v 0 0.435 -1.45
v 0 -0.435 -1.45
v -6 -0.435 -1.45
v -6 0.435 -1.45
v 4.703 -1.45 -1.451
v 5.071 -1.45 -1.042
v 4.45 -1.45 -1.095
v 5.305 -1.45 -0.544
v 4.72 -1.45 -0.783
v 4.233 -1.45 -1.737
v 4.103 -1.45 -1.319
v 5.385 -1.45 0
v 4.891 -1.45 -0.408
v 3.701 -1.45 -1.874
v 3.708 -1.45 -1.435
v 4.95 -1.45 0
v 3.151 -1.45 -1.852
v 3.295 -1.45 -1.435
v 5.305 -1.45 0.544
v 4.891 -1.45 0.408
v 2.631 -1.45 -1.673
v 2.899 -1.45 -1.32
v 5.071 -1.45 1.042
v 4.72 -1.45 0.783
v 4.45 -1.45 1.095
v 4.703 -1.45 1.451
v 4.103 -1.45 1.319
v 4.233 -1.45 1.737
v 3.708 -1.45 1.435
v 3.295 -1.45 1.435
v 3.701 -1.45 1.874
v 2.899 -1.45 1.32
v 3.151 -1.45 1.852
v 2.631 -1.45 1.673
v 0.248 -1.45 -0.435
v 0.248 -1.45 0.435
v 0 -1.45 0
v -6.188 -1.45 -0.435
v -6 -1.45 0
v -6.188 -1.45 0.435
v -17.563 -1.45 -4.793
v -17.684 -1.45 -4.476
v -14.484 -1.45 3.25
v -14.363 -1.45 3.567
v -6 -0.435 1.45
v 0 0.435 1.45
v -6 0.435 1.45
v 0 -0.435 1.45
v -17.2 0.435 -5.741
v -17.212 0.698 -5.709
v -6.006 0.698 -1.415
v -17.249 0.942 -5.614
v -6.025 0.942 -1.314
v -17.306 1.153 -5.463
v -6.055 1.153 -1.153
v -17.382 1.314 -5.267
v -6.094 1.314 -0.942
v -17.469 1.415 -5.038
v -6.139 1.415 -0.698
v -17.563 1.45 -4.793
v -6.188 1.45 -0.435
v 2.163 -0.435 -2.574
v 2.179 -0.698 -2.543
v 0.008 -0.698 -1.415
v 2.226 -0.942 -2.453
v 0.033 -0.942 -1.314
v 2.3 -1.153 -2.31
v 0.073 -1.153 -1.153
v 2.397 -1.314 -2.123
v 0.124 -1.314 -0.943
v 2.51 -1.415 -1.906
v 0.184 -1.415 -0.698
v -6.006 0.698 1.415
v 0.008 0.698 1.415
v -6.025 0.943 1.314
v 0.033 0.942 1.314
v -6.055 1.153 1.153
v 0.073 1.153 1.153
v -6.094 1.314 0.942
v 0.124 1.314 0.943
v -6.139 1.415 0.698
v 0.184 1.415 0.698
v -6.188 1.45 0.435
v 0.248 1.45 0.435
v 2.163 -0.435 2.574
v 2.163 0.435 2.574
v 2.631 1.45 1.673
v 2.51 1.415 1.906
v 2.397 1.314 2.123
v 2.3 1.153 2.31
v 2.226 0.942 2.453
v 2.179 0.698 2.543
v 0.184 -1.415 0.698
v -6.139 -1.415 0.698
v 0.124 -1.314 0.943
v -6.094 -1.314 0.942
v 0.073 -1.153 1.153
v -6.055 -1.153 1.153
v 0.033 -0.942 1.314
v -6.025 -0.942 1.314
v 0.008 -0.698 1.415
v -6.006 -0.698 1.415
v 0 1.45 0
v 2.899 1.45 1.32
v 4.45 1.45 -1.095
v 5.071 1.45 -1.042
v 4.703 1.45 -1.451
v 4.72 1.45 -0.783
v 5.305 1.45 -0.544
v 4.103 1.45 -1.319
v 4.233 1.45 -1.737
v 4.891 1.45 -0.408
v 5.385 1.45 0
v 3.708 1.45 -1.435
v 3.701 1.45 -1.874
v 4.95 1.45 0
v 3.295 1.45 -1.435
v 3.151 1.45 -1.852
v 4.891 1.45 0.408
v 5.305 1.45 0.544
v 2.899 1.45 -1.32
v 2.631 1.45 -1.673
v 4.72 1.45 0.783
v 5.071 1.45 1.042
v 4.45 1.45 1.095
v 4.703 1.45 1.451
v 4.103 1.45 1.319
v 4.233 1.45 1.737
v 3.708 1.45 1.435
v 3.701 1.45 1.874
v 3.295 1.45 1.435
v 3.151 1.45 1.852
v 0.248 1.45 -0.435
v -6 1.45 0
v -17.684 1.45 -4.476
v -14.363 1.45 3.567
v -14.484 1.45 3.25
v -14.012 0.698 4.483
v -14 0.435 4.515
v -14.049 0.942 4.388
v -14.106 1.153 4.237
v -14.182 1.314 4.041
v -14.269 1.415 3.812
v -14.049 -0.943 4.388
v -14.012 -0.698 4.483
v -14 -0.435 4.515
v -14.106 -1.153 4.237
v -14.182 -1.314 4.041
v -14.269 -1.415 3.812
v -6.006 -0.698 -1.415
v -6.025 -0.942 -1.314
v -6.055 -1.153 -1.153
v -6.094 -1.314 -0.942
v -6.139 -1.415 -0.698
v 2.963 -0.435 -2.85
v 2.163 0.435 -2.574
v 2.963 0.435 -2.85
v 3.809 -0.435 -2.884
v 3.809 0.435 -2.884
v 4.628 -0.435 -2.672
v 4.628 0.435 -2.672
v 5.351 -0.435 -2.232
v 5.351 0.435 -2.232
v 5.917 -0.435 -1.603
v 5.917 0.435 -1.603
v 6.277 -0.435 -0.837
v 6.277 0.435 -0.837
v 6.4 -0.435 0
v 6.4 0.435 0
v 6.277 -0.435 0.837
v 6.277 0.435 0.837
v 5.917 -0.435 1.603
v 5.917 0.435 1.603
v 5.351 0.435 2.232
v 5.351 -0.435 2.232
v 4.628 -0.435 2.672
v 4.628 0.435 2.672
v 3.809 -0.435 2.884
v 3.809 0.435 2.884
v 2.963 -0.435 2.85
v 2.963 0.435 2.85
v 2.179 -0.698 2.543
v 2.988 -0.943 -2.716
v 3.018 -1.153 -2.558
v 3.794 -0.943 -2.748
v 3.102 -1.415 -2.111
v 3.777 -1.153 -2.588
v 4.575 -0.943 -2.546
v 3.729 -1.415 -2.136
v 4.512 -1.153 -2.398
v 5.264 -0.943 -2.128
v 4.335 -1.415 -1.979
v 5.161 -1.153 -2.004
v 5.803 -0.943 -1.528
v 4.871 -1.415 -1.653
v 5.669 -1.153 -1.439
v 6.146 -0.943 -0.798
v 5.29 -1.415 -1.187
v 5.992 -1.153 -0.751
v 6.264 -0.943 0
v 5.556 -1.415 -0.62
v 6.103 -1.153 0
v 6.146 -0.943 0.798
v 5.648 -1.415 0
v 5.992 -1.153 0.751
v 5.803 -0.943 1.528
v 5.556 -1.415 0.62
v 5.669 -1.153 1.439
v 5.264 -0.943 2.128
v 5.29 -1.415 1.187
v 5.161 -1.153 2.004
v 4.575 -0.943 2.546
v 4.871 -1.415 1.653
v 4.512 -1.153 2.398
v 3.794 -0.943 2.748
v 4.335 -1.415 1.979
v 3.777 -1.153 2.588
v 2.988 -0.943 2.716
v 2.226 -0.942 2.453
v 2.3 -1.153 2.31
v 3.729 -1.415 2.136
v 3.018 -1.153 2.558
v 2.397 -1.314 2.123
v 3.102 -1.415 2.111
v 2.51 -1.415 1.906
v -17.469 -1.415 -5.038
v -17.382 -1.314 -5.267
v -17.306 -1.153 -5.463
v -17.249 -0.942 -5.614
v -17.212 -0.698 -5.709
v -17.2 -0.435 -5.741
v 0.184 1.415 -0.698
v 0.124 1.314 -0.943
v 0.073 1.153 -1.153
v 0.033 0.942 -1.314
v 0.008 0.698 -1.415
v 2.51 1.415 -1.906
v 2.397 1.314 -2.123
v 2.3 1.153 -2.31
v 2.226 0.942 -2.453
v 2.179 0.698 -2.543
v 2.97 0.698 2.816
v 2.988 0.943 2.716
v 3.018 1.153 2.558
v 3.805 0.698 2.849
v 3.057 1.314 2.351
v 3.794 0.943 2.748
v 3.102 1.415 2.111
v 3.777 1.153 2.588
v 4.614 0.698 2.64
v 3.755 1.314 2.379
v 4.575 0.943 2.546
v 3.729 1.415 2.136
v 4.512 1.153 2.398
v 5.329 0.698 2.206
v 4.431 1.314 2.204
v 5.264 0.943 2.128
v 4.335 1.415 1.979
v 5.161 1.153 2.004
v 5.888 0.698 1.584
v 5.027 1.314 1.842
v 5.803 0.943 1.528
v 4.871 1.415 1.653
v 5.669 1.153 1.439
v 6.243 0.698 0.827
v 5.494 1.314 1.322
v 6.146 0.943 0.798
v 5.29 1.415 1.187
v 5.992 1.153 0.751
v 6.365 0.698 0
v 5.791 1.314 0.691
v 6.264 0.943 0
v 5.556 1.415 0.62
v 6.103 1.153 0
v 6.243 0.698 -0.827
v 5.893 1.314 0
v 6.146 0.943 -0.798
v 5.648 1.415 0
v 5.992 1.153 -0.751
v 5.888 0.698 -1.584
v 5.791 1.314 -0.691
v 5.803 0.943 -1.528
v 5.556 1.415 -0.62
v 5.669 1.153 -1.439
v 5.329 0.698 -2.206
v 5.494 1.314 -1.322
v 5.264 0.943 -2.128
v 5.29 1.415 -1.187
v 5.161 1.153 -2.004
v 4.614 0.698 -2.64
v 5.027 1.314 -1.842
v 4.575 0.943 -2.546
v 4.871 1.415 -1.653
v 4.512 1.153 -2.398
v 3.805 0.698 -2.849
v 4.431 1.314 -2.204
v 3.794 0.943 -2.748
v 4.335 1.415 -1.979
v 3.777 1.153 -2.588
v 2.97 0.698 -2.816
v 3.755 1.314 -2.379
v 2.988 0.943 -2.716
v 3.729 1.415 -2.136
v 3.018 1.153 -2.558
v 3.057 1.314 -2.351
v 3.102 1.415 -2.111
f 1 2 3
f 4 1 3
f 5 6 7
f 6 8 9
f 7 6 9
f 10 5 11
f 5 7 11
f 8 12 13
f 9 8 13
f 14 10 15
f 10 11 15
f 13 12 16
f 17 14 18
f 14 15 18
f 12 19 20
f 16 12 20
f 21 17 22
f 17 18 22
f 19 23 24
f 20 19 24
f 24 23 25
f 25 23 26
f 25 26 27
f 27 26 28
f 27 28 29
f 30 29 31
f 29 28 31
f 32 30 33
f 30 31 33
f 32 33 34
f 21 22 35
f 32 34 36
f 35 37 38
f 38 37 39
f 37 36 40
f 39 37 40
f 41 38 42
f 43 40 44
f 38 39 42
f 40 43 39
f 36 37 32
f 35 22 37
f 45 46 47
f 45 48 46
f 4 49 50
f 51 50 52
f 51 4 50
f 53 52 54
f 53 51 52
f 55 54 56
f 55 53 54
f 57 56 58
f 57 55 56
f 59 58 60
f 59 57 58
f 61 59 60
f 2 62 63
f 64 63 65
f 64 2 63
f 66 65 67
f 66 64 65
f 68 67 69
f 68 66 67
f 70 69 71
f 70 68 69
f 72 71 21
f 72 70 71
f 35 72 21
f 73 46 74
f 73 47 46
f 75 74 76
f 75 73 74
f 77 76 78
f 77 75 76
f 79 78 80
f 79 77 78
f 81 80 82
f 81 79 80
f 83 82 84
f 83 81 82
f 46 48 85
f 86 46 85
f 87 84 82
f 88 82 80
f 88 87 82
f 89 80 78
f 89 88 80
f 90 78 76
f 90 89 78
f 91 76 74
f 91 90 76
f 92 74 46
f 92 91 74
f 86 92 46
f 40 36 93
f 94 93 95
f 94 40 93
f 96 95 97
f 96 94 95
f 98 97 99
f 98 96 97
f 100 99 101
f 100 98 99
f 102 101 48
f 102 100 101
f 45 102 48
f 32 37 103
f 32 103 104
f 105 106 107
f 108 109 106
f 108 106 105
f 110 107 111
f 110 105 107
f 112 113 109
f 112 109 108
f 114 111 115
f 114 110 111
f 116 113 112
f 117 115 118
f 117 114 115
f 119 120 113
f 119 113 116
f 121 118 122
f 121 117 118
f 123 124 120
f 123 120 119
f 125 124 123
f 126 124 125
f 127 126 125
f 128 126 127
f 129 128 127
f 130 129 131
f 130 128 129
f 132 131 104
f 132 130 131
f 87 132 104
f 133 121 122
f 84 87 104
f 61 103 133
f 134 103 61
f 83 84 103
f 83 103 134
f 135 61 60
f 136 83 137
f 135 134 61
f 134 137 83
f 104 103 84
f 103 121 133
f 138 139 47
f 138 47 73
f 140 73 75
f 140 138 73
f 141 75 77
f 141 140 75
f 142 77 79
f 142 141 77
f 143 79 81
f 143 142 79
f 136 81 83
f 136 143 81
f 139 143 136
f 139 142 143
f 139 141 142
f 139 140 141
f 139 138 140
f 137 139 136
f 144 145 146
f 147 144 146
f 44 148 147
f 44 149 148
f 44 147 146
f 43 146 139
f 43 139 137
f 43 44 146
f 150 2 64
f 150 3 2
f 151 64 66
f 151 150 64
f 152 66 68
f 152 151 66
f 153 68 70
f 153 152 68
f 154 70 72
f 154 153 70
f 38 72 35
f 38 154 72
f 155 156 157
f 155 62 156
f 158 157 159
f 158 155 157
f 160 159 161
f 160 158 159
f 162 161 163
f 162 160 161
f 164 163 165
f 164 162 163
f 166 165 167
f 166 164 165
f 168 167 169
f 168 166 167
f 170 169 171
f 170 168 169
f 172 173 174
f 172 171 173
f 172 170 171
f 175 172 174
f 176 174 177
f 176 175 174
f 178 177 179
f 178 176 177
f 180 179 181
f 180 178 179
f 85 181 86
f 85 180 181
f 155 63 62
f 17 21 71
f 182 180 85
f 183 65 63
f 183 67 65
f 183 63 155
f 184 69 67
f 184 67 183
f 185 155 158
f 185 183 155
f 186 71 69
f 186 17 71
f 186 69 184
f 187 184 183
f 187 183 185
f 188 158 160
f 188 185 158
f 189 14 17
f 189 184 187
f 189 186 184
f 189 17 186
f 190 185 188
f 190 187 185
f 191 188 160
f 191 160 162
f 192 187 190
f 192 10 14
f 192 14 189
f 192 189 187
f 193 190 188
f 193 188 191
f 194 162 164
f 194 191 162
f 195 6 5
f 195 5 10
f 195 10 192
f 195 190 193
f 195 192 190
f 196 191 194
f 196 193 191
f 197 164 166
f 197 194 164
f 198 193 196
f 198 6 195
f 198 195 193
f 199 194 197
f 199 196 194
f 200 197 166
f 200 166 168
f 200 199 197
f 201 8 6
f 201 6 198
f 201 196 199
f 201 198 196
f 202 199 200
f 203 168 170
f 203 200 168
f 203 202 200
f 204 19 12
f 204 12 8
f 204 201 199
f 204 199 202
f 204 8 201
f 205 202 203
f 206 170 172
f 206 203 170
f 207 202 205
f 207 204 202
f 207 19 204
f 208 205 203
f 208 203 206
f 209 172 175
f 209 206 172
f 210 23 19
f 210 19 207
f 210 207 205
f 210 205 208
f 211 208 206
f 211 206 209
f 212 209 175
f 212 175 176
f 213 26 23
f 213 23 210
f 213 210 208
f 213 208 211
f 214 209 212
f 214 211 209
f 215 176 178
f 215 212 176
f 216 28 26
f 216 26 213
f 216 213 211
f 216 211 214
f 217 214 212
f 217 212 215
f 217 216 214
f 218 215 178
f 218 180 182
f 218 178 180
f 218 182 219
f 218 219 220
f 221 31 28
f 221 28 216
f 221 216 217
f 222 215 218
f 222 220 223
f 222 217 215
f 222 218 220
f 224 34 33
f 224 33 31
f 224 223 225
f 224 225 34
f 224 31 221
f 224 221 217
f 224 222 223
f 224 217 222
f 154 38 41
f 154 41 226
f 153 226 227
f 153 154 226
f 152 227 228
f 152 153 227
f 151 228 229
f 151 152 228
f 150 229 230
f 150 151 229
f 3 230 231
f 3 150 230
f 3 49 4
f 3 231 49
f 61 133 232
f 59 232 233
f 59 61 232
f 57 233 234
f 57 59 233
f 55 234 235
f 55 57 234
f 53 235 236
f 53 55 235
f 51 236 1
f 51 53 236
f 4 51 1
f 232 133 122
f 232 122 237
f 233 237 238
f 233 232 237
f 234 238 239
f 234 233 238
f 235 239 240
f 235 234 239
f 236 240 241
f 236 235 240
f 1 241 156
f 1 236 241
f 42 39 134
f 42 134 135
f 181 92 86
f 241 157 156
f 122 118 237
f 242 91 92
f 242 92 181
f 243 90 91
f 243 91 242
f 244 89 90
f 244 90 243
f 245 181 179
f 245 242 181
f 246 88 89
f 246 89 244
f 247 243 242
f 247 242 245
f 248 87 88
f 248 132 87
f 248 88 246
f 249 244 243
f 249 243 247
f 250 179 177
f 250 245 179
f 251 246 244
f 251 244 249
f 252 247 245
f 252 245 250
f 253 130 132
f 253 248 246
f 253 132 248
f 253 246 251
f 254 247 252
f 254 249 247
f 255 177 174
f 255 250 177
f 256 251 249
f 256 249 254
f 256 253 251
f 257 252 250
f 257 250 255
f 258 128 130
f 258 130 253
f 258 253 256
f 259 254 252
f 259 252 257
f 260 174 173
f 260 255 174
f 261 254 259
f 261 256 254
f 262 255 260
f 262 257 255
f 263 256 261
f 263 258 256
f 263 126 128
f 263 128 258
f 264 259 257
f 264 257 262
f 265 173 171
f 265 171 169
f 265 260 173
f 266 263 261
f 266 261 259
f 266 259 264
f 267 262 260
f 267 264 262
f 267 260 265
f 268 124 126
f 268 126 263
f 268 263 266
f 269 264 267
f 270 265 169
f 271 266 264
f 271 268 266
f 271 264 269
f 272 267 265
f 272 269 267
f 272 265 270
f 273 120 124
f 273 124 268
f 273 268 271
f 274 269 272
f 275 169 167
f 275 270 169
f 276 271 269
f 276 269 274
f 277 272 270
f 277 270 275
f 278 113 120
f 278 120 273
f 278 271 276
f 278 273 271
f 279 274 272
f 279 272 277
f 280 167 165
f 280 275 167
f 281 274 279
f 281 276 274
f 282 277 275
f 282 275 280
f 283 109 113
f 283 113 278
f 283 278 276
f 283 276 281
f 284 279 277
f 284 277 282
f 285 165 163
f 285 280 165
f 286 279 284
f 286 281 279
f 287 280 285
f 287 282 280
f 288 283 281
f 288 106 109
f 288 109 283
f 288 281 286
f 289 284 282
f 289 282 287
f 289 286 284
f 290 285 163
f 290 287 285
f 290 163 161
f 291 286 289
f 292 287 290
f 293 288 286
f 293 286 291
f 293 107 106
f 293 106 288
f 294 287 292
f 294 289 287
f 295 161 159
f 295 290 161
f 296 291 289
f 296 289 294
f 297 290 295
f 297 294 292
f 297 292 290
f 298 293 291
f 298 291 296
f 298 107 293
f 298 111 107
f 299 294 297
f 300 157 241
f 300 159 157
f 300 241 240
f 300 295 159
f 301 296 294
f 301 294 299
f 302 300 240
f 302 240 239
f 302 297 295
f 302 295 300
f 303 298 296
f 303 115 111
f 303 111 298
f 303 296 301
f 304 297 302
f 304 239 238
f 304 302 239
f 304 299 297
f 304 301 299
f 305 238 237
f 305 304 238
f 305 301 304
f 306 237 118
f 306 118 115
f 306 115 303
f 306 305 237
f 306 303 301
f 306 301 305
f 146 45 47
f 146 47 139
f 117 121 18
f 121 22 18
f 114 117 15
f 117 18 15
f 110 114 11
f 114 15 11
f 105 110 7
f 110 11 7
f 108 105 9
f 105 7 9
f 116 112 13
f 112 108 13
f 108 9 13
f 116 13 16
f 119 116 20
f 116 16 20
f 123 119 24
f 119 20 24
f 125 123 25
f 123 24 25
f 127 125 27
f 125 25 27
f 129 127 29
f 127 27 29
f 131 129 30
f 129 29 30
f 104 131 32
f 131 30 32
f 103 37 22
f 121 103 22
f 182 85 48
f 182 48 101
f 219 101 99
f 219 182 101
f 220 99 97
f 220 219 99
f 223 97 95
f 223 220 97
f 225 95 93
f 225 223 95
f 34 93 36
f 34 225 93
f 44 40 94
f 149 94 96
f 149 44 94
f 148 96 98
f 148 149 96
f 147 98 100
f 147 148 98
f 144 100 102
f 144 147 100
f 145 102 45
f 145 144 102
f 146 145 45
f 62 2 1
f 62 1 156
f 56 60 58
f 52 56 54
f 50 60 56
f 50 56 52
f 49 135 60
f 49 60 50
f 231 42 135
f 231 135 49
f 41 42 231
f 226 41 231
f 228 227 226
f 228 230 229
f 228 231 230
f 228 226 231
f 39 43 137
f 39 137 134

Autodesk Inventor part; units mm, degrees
ref_plane "YZ Plane" through (0, 0, 0) normal (1, 0, 0) x (0, 1, 0)
sketch "Skizze1" plane through (0, 0, 0) normal (0, 1, 0) x (-1, 0, 0)
  arc A0 (-2.1633, 2.5736) -> (-2.1633, -2.5736) centre (-3.5, 0) ccw
  arc A1 (-2.8993, 1.3197) -> (-2.8993, -1.3197) centre (-3.5, 0) ccw
  line L0 (0, 1.45) -> (6, 1.45)
  line L1 (0, -1.45) -> (6, -1.45)
  line L2 (6, 1.45) -> (14, 4.515)
  line L3 (14, 4.515) -> (14.4844, 3.2505)
  line L4 (14.4844, 3.2505) -> (6, 0)
  line L5 (6, 0) -> (17.6844, -4.4765)
  line L6 (17.6844, -4.4765) -> (17.2, -5.7409)
  line L7 (17.2, -5.7409) -> (6, -1.45)
  line L8 (0, 0) -> (-2.8993, -1.3197)
  line L9 (0, 0) -> (-2.8993, 1.3197)
  line L10 (0, 1.45) -> (0, -1.45) construction
  line L11 (0, 1.45) -> (-2.1633, 2.5736)
  line L12 (0, -1.45) -> (-2.1633, -2.5736)
  line L13 (-6.4, 0) -> (6, 0) construction
  line L14 (6, 1.45) -> (6, -1.45) construction
  dimension "d0" = 6
  dimension "d1" = 14
  dimension "d2" = 159.037
  dimension "d3" = 159.037
  dimension "d4" = 3.2
  dimension "d5" = 1.45
  dimension "d6" = 2.9
  dimension "d7" = 1.45
  dimension "d8" = 1.45
  dimension "d9" = 3.5
extrude "Körper" add sketch "Skizze1" along normal mid plane 2.9
fillet "Rundung" radius 1.015 14 edges at (-10, -1.45, 2.9825) (-10, 1.45, 2.9825) (-3, -1.45, 1.45) (-3, 1.45, 1.45) (6.4, -1.45, 0) (1.0817, -1.45, -2.0118) (1.0817, -1.45, 2.0118) (6.4, 1.45, 0) (1.0817, 1.45, 2.0118) (1.0817, 1.45, -2.0118) (-3, -1.45, -1.45) (-11.6, -1.45, -3.5955) (-3, 1.45, -1.45) (-11.6, 1.45, -3.5955)
ref_plane "Work Plane1" through (0, -10, 0) normal (0, 0, -1) x (0, 1, 0)
ref_plane "Work Plane3" through (0, 0, 1.45) normal (-1, 0, 0) x (0, 1, 0)
equation "\"d0\" = MSIAB"
equation "\"d1\" = SNLG"
equation "\"d4\" = LGDIF"
equation "\"d5\" = -0.5 * SNND1 + 0.5 * KBR"
equation "\"d6\" = 0.5 * KBR"
equation "\"d7\" = 0.5 * SNND1"
equation "\"d8\" = 0.5 * SNND1"
equation "\"d9\" = KOL - 0.5 * KBR"
equation "\"d10\" = SNND1"
equation "\"d12\" = 0.35 * SNND1"
equation "\"SNND\" = 3.2"
equation "\"SNLG\" = 14"
equation "\"SNND1\" = 2.9"
equation "\"KBR\" = 5.8"
equation "\"KOL\" = 6.4"
equation "\"LGDIF\" = 3.2"
equation "\"MSIAB\" = 6"
equation "\"NNDMAX\" = 14"
equation "\"DSH\" = 6"
equation "\"NNDMIN\" = 11"
properties part number "ISO 1234 - 3,2 x 14" material "Stahl"
